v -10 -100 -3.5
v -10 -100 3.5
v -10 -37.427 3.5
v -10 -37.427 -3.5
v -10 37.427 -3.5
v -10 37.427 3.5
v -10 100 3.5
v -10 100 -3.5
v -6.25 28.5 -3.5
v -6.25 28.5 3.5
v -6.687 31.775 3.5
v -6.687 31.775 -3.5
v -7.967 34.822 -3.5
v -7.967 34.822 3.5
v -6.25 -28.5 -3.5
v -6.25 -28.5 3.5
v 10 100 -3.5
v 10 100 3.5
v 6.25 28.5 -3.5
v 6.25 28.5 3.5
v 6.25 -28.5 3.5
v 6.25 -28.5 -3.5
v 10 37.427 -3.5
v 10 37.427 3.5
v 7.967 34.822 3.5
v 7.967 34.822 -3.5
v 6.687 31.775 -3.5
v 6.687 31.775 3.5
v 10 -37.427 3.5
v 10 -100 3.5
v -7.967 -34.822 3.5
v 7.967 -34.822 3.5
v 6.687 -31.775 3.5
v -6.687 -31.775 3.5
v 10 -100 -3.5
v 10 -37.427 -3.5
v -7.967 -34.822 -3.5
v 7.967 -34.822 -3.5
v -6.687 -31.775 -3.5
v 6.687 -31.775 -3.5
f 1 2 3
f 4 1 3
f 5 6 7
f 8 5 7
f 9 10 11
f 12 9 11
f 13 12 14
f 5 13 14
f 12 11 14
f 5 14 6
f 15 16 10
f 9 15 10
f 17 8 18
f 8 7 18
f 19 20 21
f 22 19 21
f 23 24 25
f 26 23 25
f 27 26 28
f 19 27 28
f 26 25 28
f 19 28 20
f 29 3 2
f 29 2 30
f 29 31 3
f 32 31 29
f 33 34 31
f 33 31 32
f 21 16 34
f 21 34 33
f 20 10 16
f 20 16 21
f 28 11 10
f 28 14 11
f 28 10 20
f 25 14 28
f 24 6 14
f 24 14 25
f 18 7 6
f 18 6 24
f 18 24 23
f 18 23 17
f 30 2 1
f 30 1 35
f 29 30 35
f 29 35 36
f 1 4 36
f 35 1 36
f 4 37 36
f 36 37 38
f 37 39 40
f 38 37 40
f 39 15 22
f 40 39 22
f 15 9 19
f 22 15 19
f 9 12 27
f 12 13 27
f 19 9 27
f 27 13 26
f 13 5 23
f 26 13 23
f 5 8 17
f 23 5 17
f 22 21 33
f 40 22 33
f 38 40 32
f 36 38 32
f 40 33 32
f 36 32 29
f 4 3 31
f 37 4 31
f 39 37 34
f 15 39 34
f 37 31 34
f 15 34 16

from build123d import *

# Parameters (mm, degrees)
SKETCH1_W           = 19.999999878
SKETCH1_H           = 200.00000005
BOSS_EXTRUDE1_DEPTH = 3.499999985
CUT_EXTRUDE1_DEPTH  = 7.112


with BuildPart() as part:
    # Sketch1 → Boss-Extrude1 (new, symmetric)
    with BuildSketch(Plane.XY):
        Rectangle(SKETCH1_W, SKETCH1_H)
    extrude(amount=BOSS_EXTRUDE1_DEPTH, both=True)

    # Sketch2 → Cut-Extrude1 (cut)
    with BuildSketch(Plane.XY.offset(3.499999985)):
        with BuildLine():
            ThreePointArc((-9.999999939, 19.57321454), (-7.225569373, 23.658770866), (-6.249999946, 28.500000023))
            ThreePointArc((-6.249999946, 28.500000023), (-7.225569373, 33.34122918), (-9.999999939, 37.426785506))
            Line((-9.999999939, 37.426785506), (-9.999999939, 19.57321454))
        make_face()
        with BuildLine():
            ThreePointArc((-9.999999939, 37.426785506), (-31.24999973, 28.500000023), (-9.999999939, 19.57321454))
            Line((-9.999999939, 19.57321454), (-9.999999939, 37.426785506))
        make_face()
        with BuildLine():
            ThreePointArc((9.999999939, 37.426785506), (7.225569373, 33.34122918), (6.249999946, 28.500000023))
            ThreePointArc((6.249999946, 28.500000023), (7.225569373, 23.658770866), (9.999999939, 19.57321454))
            Line((9.999999939, 19.57321454), (9.999999939, 37.426785506))
        make_face()
        with BuildLine():
            Line((9.999999939, 37.426785506), (9.999999939, 19.57321454))
            ThreePointArc((9.999999939, 19.57321454), (23.591228995, 16.975569558), (31.24999973, 28.500000023))
            ThreePointArc((31.24999973, 28.500000023), (23.591228995, 40.024430488), (9.999999939, 37.426785506))
        make_face()
        with BuildLine():
            Line((6.249999946, 28.500000023), (6.249999946, -28.500000023))
            ThreePointArc((6.249999946, -28.500000023), (7.225569373, -23.658770866), (9.999999939, -19.57321454))
            Line((9.999999939, -19.57321454), (9.999999939, 19.57321454))
            ThreePointArc((9.999999939, 19.57321454), (7.225569373, 23.658770866), (6.249999946, 28.500000023))
        make_face()
        with BuildLine():
            ThreePointArc((-9.999999939, -19.57321454), (-7.225569373, -23.658770866), (-6.249999946, -28.500000023))
            Line((-6.249999946, -28.500000023), (-6.249999946, 28.500000023))
            ThreePointArc((-6.249999946, 28.500000023), (-7.225569373, 23.658770866), (-9.999999939, 19.57321454))
            Line((-9.999999939, 19.57321454), (-9.999999939, -19.57321454))
        make_face()
        with BuildLine():
            ThreePointArc((-9.999999939, -37.426785506), (-7.225569373, -33.34122918), (-6.249999946, -28.500000023))
            ThreePointArc((-6.249999946, -28.500000023), (-7.225569373, -23.658770866), (-9.999999939, -19.57321454))
            Line((-9.999999939, -19.57321454), (-9.999999939, -37.426785506))
        make_face()
        with BuildLine():
            Line((-9.999999939, -37.426785506), (-9.999999939, -19.57321454))
            ThreePointArc((-9.999999939, -19.57321454), (-31.24999973, -28.500000023), (-9.999999939, -37.426785506))
        make_face()
        with BuildLine():
            ThreePointArc((9.999999939, -19.57321454), (7.225569373, -23.658770866), (6.249999946, -28.500000023))
            ThreePointArc((6.249999946, -28.500000023), (7.225569373, -33.34122918), (9.999999939, -37.426785506))
            Line((9.999999939, -37.426785506), (9.999999939, -19.57321454))
        make_face()
        with BuildLine():
            ThreePointArc((31.24999973, -28.500000023), (23.591228995, -16.975569558), (9.999999939, -19.57321454))
            Line((9.999999939, -19.57321454), (9.999999939, -37.426785506))
            ThreePointArc((9.999999939, -37.426785506), (23.591228995, -40.024430488), (31.24999973, -28.500000023))
        make_face()
    extrude(amount=-CUT_EXTRUDE1_DEPTH, mode=Mode.SUBTRACT)


solid = part.part
